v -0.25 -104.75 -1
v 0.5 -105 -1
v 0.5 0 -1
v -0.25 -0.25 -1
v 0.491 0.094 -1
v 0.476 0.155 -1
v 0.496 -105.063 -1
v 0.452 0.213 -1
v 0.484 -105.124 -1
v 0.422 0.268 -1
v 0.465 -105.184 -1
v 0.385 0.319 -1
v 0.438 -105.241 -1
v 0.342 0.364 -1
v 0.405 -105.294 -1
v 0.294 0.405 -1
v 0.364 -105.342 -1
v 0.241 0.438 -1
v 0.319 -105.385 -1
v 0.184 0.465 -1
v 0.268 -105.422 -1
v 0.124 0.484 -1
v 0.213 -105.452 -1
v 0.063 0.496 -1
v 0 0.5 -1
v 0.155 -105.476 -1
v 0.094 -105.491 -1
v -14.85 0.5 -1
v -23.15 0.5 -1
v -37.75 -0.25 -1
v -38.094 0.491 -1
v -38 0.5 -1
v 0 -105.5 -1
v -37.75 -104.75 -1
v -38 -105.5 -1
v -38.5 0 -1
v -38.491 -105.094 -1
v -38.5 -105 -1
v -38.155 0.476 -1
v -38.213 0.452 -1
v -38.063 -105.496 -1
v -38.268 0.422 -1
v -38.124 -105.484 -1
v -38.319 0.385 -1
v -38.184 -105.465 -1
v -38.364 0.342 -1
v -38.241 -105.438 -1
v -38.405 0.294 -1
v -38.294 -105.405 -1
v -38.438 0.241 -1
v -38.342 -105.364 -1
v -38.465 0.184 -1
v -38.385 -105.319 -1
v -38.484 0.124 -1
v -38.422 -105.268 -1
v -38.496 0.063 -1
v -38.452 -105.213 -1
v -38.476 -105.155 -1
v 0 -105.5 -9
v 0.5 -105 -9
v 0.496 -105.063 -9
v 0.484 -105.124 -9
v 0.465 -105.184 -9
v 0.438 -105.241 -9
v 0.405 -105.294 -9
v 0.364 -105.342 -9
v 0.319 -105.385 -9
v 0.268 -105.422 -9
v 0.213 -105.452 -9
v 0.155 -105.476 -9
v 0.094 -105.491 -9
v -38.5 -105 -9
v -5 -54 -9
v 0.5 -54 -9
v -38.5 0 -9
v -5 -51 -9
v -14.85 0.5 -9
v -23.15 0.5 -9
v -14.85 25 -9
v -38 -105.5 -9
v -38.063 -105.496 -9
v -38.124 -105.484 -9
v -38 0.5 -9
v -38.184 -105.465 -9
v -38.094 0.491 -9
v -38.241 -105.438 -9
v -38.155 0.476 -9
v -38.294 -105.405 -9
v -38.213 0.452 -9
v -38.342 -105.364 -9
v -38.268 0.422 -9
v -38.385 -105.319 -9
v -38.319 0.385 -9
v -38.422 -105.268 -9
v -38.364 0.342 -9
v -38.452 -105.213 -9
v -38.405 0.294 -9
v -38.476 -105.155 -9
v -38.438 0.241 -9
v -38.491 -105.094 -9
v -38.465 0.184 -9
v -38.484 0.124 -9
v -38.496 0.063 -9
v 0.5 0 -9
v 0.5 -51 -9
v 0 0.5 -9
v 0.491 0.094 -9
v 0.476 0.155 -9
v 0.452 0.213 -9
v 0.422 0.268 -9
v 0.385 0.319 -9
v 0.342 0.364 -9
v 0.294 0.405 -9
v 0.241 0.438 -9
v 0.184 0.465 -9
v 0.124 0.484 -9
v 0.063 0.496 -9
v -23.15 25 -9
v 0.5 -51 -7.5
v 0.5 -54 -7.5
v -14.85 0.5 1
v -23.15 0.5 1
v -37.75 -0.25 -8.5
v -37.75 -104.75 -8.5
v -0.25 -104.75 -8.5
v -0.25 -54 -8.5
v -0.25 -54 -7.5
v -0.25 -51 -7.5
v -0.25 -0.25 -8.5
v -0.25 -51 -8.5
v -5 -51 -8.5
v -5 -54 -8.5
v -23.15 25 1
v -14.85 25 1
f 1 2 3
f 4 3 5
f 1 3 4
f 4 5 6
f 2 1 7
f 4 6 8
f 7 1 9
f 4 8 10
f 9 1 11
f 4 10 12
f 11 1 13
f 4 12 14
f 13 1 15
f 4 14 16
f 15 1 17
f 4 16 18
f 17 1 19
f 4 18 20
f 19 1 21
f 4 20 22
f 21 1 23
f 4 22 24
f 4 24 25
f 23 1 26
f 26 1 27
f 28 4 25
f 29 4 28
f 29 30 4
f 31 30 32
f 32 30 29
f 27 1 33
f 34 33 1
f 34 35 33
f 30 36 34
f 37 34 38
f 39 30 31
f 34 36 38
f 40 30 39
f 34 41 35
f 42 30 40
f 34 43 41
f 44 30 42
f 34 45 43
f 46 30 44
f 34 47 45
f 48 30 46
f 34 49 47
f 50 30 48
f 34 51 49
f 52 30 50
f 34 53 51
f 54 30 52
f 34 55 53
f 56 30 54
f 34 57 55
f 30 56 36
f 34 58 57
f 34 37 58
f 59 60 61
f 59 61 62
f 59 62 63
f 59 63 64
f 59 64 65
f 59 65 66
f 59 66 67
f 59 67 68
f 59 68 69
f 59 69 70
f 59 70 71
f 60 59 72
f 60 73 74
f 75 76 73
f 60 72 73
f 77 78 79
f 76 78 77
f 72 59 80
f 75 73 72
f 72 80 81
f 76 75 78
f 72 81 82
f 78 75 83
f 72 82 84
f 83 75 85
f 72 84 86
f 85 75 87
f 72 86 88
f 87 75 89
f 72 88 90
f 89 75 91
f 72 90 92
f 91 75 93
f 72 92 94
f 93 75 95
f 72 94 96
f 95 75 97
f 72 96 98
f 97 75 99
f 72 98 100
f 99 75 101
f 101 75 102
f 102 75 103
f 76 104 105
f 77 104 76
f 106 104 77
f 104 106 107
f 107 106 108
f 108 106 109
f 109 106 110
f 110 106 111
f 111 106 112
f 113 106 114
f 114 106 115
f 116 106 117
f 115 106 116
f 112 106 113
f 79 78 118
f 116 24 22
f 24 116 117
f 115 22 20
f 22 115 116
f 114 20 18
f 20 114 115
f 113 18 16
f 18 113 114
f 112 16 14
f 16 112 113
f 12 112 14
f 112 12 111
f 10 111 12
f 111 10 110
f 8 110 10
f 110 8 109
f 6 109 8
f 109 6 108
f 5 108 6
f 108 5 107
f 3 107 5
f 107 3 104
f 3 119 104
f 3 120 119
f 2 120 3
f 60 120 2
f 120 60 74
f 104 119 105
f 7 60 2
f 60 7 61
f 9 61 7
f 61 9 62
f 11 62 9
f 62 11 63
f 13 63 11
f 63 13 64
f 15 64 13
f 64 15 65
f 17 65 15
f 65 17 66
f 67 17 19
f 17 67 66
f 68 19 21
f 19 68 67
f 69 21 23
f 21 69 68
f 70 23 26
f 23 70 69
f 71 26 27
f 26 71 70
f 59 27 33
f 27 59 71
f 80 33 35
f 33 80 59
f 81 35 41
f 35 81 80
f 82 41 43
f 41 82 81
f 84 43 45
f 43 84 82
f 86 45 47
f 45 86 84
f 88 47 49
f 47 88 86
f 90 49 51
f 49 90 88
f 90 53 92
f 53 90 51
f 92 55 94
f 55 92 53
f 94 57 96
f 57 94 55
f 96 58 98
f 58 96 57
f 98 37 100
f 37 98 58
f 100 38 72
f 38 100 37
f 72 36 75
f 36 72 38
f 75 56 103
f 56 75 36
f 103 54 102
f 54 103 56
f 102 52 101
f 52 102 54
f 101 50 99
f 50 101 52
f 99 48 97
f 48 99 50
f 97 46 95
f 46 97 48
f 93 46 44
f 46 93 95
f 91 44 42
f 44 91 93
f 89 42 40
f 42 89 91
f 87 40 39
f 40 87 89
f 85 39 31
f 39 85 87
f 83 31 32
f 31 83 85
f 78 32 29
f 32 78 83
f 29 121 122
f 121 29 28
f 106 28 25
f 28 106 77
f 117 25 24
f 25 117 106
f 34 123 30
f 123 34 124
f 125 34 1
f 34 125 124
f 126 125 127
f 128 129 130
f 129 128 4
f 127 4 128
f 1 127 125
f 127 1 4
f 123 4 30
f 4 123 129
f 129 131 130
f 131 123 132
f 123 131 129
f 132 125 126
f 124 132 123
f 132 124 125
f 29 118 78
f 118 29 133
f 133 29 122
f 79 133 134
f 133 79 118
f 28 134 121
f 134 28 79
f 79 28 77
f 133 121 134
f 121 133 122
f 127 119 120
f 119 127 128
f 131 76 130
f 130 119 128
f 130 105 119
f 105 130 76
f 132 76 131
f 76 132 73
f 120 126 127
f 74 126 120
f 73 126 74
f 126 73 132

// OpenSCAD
$fn=50;

BOX_W = 38;
BOX_L = 105;
BOX_H = 8.0;
WALL = 0.5;
CORNER_RADIUS = 0.5;

MIC_OUTSIDE_WIDTH=8.3;
MIC_OUTSIDE_HEIGHT=10.0;
MIC_INSIDE_WIDTH=6.3;
MIC_LENGTH=24.5;

MIC_OFFSET_X = 0;
MIC_OFFSET_Y = -34.0;
MIC_OFFSET_Z = 0;

VENT_OFFSET = -4.5;
VENT_L = 19.0;
VENT_R = -19.0;

module roundedRectangle(width, length, radius) {
    difference() {
        offset(r=radius) square([width, length], center=true);
        offset(r=radius - WALL) square([width - WALL, length - WALL], center=true);
    }
}

module mainLid() {
    // sides of box
    linear_extrude(BOX_H)
    roundedRectangle(BOX_W, BOX_L, CORNER_RADIUS);
    // base of box
    translate([0, 0, BOX_H - WALL]) {
        linear_extrude(WALL) square([BOX_W, BOX_L], center=true);
    }
}

module micBox() {
    translate([0, -53.0, 3])
    rotate([90, 0, 0])
    linear_extrude(MIC_LENGTH) square([MIC_OUTSIDE_WIDTH, MIC_OUTSIDE_HEIGHT], center=true);
}

module cutouts() {
    translate([MIC_OFFSET_X, MIC_OFFSET_Y, MIC_OFFSET_Z]) {
        // Inside mic channel
        translate([0, +110, BOX_H-18])
        rotate([90, 0, 0])
        linear_extrude(MIC_LENGTH+4.1) square([MIC_INSIDE_WIDTH, MIC_OUTSIDE_HEIGHT], center=true);
    }

    // Cable exit
    translate([0, -51.0, BOX_H-18.5])
    rotate([90, 0, 0])
    #linear_extrude(3.0) square([10, 6], center=true);
}

difference() {
    rotate([180, 0, 0]) { // Flipping the entire object along the X axis
        union() {
            translate([0, 0, 9.0]) { // Moving the lid to the opposite side of the base frame
                translate([-BOX_W/2, BOX_L/2, -BOX_H]) { // Shifting the center of the back to (0,0,0)
                    mainLid();
                    micBox();
                }
            }
        }
    }
    cutouts();
}
